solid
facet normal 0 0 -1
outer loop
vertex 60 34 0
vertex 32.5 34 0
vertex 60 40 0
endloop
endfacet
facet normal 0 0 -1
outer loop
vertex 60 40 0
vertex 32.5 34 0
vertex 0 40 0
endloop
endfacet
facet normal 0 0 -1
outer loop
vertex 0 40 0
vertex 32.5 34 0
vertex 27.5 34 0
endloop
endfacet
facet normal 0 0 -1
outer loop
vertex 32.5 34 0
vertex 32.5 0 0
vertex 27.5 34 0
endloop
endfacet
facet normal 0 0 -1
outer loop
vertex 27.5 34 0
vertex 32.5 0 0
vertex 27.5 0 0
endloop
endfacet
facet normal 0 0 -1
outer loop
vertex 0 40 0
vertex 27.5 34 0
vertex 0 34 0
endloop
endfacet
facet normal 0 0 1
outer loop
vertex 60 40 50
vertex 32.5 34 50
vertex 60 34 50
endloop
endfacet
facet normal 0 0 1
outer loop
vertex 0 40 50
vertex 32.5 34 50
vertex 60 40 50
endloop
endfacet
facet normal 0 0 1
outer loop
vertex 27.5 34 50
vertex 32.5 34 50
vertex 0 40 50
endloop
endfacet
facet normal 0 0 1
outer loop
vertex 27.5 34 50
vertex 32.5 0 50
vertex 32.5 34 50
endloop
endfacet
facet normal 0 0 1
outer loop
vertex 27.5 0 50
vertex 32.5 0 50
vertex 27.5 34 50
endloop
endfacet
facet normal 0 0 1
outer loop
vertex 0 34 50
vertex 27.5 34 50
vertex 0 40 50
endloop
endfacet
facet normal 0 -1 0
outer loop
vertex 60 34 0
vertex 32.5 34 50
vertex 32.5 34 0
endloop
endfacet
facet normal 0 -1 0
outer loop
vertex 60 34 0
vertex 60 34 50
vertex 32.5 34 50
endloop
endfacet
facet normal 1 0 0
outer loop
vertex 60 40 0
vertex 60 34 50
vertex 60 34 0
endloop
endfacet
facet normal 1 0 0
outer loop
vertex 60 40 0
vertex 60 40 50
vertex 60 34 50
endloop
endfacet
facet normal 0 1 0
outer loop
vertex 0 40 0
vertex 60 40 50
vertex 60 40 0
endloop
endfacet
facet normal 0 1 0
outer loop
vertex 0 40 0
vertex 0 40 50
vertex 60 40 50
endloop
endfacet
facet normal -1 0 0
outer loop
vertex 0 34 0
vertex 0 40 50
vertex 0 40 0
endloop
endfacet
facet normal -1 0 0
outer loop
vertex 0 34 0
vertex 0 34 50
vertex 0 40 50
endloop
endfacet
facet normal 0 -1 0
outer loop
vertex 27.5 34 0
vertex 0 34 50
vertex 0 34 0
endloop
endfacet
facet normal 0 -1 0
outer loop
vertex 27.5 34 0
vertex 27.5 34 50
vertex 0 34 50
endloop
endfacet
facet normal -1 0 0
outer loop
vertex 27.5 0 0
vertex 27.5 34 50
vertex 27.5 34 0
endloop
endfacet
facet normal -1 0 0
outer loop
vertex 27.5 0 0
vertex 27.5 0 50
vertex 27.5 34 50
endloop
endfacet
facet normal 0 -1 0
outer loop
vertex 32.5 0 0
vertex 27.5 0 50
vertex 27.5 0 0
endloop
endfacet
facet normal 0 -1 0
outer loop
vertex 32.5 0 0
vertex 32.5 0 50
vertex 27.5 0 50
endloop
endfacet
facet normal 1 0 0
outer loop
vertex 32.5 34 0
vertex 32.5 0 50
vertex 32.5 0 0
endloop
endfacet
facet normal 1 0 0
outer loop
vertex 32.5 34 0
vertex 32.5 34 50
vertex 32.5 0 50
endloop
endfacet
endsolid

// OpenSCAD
$fn = 32;

// ----------------------------------------------------------------------
// Structural section: tee 60 x 40 mm
// ----------------------------------------------------------------------

// --- parameters (mm) ---
sec_w = 60;               // tee width, X
sec_h = 40;               // tee height, Y
flange_t = 6;             // top flange thickness
web_t = 5;                // web thickness
plate_t = 50;             // cut length, Z (extrusion height)

profile = [[27.5, 0], [32.5, 0], [32.5, 34], [60, 34], [60, 40], [0, 40], [0, 34], [27.5, 34]];  // primary outline, 8 points, counter clockwise

// --- the one profile operation ---
linear_extrude(height = plate_t) polygon(points = profile);
